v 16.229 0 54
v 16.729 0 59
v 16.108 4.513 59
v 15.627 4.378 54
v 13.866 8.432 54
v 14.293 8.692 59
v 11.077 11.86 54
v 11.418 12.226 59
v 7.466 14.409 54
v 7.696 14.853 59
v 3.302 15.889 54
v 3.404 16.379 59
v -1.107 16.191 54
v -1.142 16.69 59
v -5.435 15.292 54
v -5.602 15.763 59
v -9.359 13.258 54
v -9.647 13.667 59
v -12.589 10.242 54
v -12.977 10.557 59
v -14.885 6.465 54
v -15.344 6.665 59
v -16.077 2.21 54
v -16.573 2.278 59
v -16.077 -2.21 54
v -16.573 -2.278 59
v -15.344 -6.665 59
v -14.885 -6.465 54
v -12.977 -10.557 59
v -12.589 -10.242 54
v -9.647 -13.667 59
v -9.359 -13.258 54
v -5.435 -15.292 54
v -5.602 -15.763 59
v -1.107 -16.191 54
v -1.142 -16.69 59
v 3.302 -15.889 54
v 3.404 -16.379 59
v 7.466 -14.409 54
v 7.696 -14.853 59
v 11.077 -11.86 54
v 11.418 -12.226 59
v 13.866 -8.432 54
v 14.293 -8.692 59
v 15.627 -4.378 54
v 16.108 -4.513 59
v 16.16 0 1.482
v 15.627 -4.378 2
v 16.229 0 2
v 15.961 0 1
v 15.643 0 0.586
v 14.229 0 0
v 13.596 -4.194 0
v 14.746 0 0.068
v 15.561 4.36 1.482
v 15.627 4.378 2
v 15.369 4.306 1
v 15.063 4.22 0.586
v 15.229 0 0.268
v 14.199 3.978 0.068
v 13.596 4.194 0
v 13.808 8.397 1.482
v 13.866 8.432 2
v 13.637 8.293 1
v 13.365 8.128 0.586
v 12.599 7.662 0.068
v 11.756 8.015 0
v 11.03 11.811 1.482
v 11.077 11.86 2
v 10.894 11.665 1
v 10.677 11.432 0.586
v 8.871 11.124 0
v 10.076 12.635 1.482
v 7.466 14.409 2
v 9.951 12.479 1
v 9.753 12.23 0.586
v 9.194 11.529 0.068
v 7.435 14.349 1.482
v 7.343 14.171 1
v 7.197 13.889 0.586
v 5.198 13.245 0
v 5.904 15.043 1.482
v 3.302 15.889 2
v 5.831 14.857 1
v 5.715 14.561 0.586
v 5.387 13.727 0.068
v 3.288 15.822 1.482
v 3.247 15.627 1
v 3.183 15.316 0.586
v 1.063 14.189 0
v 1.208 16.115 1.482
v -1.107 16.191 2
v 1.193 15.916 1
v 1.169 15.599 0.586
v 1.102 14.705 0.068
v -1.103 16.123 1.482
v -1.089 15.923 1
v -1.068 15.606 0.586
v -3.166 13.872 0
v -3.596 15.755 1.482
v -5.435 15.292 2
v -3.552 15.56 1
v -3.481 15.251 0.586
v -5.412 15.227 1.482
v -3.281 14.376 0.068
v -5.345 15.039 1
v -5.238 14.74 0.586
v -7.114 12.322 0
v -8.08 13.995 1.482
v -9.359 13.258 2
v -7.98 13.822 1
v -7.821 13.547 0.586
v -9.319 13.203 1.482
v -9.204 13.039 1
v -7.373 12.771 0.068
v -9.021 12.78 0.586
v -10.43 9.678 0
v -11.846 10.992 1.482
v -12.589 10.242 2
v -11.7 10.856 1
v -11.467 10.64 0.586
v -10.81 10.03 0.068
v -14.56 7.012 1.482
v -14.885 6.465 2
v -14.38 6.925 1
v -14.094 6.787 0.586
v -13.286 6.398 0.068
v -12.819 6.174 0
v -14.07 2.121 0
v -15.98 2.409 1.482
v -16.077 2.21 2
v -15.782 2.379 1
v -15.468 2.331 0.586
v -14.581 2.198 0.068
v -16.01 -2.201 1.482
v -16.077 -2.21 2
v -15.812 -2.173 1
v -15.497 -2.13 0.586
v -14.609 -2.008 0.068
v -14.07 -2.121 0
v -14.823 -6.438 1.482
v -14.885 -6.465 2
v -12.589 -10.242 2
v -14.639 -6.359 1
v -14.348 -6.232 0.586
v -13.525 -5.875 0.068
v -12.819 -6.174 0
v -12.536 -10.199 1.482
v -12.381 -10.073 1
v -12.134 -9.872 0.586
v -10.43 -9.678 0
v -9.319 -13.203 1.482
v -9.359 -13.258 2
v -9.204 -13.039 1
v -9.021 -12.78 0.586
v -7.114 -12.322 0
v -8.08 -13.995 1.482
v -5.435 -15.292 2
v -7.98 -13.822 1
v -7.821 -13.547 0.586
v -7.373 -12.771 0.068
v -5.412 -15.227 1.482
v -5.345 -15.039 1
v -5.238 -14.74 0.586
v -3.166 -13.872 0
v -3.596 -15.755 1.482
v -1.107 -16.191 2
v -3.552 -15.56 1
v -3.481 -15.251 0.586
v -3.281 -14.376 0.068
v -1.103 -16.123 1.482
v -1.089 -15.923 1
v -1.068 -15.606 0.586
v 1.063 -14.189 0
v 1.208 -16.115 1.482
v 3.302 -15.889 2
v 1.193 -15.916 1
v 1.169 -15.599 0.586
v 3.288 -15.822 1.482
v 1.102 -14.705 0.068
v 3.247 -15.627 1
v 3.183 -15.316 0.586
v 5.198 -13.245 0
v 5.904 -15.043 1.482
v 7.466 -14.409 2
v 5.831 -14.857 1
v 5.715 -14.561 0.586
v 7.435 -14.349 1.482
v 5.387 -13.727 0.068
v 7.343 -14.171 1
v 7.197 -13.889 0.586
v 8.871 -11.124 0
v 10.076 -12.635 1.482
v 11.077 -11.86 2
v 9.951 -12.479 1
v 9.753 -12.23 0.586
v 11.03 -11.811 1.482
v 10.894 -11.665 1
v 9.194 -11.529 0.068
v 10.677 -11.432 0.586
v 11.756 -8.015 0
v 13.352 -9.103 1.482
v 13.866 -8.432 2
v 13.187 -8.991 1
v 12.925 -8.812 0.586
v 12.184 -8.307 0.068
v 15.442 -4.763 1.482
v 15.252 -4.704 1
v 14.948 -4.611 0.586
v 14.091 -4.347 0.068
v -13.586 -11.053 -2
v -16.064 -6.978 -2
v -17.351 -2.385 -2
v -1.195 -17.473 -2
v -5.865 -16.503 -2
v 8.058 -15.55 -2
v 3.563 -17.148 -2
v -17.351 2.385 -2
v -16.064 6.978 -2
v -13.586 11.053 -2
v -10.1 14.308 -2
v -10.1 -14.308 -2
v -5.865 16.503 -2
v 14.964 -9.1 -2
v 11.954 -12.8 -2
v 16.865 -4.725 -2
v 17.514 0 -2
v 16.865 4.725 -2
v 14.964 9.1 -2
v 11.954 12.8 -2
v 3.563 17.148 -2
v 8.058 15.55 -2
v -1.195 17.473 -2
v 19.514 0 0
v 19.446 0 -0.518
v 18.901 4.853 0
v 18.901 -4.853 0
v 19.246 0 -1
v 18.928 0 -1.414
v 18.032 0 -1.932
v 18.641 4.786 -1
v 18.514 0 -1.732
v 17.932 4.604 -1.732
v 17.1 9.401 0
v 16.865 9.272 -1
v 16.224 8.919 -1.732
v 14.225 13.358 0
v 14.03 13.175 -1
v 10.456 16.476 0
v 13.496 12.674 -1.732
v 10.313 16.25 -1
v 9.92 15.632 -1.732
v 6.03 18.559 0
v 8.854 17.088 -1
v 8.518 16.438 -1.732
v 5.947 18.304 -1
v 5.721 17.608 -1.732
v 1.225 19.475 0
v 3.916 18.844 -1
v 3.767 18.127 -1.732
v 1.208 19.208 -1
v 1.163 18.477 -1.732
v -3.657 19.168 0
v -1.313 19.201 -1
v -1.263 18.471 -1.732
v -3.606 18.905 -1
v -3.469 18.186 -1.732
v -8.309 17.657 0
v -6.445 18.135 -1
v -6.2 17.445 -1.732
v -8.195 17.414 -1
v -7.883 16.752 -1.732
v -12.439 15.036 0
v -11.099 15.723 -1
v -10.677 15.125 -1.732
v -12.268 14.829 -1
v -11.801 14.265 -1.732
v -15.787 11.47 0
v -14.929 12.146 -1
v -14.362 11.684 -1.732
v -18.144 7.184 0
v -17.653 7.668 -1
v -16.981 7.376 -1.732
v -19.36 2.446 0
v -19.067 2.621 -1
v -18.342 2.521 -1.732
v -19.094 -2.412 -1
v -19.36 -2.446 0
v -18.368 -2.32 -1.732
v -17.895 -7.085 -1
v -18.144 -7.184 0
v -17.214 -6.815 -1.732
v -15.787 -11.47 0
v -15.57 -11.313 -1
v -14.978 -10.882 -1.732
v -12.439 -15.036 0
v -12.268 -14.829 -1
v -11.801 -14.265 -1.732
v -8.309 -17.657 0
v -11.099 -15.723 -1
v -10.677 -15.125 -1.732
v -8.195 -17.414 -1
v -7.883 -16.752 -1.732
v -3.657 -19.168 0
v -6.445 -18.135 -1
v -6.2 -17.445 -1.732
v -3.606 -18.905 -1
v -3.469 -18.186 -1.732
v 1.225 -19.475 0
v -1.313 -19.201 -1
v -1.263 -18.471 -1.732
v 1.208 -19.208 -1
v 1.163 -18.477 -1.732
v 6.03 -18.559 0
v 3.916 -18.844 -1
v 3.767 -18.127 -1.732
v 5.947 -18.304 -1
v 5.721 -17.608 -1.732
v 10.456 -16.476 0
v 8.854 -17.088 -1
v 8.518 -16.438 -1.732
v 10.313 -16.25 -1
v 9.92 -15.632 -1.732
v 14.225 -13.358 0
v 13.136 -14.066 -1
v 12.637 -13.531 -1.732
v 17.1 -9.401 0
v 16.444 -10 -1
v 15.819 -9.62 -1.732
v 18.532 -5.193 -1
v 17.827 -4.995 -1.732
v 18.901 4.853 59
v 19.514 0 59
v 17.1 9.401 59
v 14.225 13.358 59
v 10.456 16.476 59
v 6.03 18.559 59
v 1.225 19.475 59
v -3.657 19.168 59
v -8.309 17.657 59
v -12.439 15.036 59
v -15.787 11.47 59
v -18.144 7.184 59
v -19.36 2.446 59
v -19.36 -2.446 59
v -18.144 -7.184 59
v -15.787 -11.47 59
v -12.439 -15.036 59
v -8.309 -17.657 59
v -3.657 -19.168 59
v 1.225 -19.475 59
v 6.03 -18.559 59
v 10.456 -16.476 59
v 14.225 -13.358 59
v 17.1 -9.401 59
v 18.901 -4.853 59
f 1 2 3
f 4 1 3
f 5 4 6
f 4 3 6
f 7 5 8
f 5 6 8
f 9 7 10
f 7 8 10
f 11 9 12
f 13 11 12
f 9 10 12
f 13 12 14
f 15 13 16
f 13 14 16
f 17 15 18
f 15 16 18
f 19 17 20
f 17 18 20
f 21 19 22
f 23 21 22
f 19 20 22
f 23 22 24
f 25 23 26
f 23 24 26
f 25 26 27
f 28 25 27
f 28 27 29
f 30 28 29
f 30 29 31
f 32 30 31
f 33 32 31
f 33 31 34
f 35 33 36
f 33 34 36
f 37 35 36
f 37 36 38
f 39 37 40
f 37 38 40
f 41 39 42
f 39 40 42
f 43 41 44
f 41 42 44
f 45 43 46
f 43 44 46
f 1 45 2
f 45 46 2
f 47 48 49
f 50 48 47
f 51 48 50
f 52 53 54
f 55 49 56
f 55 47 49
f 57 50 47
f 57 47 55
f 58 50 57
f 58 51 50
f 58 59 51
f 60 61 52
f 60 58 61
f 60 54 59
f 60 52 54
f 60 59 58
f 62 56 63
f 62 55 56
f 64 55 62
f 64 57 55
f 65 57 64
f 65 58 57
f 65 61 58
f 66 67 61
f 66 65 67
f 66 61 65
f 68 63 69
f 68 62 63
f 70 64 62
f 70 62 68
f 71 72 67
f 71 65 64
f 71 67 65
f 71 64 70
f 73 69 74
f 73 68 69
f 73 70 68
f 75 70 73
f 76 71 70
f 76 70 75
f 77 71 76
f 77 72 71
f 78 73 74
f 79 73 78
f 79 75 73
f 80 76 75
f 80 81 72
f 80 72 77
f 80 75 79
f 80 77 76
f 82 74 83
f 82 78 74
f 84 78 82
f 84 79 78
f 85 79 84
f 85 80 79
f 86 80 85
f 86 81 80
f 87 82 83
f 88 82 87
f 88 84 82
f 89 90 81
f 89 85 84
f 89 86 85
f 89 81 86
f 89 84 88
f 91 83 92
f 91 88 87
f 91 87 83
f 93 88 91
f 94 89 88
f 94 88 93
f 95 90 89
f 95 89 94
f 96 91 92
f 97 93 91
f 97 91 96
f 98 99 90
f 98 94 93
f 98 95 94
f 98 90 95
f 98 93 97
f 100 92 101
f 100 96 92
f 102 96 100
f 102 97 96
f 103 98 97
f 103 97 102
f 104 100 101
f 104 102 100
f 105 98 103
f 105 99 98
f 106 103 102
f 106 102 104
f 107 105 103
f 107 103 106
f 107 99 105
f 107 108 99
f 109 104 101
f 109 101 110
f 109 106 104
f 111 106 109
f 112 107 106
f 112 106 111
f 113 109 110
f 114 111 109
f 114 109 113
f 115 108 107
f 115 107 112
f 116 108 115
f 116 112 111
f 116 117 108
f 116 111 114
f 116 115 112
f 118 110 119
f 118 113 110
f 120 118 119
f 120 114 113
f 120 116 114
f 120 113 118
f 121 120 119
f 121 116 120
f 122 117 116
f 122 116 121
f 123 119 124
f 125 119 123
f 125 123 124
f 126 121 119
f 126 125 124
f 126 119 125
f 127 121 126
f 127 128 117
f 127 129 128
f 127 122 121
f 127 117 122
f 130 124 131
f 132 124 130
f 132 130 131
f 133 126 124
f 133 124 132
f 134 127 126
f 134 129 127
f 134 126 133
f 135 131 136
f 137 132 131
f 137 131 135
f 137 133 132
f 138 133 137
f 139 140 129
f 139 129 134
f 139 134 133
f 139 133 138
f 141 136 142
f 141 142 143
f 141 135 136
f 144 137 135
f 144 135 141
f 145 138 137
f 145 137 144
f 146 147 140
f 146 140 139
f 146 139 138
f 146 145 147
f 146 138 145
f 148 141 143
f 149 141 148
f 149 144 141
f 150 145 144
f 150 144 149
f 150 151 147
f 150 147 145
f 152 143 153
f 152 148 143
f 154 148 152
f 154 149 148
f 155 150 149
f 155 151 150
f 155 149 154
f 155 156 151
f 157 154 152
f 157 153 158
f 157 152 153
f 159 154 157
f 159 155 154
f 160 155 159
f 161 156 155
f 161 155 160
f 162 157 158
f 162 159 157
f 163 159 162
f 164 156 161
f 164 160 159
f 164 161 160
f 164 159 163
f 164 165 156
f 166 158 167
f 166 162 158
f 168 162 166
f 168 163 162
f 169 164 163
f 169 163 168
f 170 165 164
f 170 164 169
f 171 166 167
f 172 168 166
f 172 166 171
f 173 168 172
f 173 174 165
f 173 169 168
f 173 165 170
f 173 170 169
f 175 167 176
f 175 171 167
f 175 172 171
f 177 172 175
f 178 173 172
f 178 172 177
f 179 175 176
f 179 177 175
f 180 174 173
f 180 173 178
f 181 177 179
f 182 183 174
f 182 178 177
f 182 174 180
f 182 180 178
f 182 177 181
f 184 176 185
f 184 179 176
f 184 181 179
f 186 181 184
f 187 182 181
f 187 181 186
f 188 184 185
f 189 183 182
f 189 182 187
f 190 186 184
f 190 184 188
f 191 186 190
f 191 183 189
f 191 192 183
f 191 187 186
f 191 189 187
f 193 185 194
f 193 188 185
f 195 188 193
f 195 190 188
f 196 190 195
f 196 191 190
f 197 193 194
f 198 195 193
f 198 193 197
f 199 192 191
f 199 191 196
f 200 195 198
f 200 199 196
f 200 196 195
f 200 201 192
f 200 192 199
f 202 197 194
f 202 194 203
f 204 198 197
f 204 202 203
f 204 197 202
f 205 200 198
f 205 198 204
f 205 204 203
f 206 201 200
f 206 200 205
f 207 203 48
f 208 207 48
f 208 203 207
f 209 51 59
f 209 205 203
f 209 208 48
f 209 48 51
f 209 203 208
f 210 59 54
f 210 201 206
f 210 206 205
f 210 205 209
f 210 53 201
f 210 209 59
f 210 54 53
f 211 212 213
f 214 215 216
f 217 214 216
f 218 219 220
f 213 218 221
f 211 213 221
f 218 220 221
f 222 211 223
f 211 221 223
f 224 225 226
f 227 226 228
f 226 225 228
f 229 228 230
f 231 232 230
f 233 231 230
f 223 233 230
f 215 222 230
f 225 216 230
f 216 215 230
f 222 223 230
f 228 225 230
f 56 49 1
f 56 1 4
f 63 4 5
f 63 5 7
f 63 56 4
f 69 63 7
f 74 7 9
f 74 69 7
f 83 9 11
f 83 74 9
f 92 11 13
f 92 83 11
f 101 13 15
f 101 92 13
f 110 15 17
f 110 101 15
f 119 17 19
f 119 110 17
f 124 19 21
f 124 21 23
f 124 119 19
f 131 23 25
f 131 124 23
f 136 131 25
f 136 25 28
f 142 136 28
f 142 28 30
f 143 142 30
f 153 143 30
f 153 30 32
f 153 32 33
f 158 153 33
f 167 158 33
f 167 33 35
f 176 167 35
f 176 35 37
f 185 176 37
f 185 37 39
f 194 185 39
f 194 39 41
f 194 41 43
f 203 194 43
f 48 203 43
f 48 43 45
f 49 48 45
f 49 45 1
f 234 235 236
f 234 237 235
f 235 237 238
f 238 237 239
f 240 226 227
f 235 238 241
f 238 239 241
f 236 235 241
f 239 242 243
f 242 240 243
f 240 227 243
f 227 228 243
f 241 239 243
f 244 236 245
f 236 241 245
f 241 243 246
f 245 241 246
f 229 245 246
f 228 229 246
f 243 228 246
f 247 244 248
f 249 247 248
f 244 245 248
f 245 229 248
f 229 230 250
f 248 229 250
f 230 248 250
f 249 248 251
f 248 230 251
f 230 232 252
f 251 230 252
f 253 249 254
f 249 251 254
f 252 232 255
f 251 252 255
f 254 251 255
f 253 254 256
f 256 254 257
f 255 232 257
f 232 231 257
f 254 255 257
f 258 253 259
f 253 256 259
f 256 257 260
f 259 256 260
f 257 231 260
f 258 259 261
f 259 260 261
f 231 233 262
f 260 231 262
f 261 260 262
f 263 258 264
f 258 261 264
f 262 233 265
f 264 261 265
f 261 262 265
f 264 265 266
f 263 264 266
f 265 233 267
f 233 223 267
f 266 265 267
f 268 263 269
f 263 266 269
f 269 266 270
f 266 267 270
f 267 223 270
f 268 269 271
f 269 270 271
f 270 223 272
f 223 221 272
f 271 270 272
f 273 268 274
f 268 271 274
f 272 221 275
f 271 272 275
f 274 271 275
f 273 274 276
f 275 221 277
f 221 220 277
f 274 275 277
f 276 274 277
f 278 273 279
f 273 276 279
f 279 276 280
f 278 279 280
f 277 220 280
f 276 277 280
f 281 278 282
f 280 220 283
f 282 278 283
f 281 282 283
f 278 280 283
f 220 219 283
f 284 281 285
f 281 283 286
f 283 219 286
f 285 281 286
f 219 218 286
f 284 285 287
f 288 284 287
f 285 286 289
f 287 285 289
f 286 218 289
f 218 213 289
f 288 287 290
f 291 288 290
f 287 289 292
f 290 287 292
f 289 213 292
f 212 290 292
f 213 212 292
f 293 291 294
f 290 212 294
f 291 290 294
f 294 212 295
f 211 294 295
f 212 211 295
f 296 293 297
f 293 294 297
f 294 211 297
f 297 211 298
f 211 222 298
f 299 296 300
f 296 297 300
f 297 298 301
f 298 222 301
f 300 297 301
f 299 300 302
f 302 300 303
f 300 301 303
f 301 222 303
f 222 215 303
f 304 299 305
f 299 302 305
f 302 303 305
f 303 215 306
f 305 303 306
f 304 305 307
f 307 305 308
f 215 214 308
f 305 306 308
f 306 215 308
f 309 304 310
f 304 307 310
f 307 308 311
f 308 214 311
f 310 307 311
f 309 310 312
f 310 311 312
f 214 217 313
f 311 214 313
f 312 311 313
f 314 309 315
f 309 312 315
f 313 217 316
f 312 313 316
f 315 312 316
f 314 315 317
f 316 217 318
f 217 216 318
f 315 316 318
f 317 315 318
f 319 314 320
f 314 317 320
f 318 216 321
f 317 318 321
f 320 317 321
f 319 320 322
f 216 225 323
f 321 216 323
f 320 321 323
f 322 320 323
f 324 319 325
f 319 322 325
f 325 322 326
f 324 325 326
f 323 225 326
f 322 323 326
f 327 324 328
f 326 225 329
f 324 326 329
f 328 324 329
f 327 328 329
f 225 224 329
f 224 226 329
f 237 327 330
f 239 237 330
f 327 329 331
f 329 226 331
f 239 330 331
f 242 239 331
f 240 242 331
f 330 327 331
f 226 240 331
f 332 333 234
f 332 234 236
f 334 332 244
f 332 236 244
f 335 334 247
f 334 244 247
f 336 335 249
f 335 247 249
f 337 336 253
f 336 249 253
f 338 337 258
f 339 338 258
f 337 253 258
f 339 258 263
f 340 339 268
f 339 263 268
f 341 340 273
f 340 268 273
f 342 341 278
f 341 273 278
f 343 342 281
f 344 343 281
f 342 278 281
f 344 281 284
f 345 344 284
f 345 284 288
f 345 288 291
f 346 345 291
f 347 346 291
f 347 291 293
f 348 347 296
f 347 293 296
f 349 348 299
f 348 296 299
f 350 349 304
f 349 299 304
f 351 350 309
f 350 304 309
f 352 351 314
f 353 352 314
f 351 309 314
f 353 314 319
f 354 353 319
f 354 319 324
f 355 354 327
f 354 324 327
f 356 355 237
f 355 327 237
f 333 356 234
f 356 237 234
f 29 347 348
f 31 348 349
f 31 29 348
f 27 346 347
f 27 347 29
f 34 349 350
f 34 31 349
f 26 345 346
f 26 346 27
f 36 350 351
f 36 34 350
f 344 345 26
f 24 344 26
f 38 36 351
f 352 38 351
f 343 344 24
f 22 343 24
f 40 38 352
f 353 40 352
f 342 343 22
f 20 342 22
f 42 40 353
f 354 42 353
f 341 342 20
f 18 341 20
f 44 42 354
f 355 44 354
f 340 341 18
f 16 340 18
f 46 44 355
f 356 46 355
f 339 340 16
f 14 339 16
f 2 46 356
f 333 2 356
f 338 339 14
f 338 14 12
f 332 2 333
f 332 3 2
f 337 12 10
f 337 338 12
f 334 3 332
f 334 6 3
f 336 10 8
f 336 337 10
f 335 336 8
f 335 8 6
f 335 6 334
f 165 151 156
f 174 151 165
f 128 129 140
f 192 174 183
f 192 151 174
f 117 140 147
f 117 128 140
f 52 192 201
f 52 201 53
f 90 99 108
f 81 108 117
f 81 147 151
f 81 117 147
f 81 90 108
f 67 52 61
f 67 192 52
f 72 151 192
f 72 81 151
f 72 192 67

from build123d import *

# Parameters (mm, degrees)
F0_R     = 19.5140017551
F0_R_2   = 16.2285581311
F1_DEPTH = 2
F2_DEPTH = 59
F4_SIZE2 = 0.5
F4_SIZE  = 5


# Not quite as in the source:
# - a fillet or chamfer that OpenCascade refuses, or shapes differently, is made with other operations: its cross-section is extruded or revolved along the edge and cut away or added


with BuildPart() as f1:
    # F0 (on Top) → F1 (new body)
    with BuildSketch(Plane.XY):
        Circle(F0_R)
        Circle(F0_R_2, mode=Mode.SUBTRACT)
        Circle(F0_R_2)
    extrude(amount=-F1_DEPTH)

    # F0 (on Top) → F2 (join)
    with BuildSketch(Plane.XY):
        Circle(F0_R)
        Circle(F0_R_2, mode=Mode.SUBTRACT)
    extrude(amount=F2_DEPTH)

    # F3: fillet of radius 2 on 2 edges, made by hand

    # F3_s1 → F3_t2 (revolve, cut)
    with BuildSketch(Plane.XZ):
        with BuildLine():
            ThreePointArc((19.5140017551, 0), (18.9282153175, -1.4142135624), (17.5140017551, -2))
            Line((17.5140017551, -2), (19.5140017551, -2))
            Line((19.5140017551, -2), (19.5140017551, 0))
        make_face()
    revolve(axis=Axis((0, 0, -2), (0, 0, 1)), mode=Mode.SUBTRACT)

    # F3_s3 → F3_t4 (revolve)
    with BuildSketch(Plane.XZ):
        with BuildLine():
            ThreePointArc((16.2285581311, 2), (15.6427716934, 0.5857864376), (14.2285581311, 0))
            Line((14.2285581311, 0), (16.2285581311, 0))
            Line((16.2285581311, 0), (16.2285581311, 2))
        make_face()
    revolve(axis=Axis((0, 0, 0), (0, 0, 1)))

    # F4
    f4_edges = [f1.edges().sort_by_distance(p)[0] for p in [
        (-16.228558, 0, 59),
    ]]
    f4_side = f1.faces().sort_by_distance((-16.228558, 0, 30.5))[0]
    chamfer(f4_edges, length=F4_SIZE, length2=F4_SIZE2, reference=f4_side)


solid = f1.part
